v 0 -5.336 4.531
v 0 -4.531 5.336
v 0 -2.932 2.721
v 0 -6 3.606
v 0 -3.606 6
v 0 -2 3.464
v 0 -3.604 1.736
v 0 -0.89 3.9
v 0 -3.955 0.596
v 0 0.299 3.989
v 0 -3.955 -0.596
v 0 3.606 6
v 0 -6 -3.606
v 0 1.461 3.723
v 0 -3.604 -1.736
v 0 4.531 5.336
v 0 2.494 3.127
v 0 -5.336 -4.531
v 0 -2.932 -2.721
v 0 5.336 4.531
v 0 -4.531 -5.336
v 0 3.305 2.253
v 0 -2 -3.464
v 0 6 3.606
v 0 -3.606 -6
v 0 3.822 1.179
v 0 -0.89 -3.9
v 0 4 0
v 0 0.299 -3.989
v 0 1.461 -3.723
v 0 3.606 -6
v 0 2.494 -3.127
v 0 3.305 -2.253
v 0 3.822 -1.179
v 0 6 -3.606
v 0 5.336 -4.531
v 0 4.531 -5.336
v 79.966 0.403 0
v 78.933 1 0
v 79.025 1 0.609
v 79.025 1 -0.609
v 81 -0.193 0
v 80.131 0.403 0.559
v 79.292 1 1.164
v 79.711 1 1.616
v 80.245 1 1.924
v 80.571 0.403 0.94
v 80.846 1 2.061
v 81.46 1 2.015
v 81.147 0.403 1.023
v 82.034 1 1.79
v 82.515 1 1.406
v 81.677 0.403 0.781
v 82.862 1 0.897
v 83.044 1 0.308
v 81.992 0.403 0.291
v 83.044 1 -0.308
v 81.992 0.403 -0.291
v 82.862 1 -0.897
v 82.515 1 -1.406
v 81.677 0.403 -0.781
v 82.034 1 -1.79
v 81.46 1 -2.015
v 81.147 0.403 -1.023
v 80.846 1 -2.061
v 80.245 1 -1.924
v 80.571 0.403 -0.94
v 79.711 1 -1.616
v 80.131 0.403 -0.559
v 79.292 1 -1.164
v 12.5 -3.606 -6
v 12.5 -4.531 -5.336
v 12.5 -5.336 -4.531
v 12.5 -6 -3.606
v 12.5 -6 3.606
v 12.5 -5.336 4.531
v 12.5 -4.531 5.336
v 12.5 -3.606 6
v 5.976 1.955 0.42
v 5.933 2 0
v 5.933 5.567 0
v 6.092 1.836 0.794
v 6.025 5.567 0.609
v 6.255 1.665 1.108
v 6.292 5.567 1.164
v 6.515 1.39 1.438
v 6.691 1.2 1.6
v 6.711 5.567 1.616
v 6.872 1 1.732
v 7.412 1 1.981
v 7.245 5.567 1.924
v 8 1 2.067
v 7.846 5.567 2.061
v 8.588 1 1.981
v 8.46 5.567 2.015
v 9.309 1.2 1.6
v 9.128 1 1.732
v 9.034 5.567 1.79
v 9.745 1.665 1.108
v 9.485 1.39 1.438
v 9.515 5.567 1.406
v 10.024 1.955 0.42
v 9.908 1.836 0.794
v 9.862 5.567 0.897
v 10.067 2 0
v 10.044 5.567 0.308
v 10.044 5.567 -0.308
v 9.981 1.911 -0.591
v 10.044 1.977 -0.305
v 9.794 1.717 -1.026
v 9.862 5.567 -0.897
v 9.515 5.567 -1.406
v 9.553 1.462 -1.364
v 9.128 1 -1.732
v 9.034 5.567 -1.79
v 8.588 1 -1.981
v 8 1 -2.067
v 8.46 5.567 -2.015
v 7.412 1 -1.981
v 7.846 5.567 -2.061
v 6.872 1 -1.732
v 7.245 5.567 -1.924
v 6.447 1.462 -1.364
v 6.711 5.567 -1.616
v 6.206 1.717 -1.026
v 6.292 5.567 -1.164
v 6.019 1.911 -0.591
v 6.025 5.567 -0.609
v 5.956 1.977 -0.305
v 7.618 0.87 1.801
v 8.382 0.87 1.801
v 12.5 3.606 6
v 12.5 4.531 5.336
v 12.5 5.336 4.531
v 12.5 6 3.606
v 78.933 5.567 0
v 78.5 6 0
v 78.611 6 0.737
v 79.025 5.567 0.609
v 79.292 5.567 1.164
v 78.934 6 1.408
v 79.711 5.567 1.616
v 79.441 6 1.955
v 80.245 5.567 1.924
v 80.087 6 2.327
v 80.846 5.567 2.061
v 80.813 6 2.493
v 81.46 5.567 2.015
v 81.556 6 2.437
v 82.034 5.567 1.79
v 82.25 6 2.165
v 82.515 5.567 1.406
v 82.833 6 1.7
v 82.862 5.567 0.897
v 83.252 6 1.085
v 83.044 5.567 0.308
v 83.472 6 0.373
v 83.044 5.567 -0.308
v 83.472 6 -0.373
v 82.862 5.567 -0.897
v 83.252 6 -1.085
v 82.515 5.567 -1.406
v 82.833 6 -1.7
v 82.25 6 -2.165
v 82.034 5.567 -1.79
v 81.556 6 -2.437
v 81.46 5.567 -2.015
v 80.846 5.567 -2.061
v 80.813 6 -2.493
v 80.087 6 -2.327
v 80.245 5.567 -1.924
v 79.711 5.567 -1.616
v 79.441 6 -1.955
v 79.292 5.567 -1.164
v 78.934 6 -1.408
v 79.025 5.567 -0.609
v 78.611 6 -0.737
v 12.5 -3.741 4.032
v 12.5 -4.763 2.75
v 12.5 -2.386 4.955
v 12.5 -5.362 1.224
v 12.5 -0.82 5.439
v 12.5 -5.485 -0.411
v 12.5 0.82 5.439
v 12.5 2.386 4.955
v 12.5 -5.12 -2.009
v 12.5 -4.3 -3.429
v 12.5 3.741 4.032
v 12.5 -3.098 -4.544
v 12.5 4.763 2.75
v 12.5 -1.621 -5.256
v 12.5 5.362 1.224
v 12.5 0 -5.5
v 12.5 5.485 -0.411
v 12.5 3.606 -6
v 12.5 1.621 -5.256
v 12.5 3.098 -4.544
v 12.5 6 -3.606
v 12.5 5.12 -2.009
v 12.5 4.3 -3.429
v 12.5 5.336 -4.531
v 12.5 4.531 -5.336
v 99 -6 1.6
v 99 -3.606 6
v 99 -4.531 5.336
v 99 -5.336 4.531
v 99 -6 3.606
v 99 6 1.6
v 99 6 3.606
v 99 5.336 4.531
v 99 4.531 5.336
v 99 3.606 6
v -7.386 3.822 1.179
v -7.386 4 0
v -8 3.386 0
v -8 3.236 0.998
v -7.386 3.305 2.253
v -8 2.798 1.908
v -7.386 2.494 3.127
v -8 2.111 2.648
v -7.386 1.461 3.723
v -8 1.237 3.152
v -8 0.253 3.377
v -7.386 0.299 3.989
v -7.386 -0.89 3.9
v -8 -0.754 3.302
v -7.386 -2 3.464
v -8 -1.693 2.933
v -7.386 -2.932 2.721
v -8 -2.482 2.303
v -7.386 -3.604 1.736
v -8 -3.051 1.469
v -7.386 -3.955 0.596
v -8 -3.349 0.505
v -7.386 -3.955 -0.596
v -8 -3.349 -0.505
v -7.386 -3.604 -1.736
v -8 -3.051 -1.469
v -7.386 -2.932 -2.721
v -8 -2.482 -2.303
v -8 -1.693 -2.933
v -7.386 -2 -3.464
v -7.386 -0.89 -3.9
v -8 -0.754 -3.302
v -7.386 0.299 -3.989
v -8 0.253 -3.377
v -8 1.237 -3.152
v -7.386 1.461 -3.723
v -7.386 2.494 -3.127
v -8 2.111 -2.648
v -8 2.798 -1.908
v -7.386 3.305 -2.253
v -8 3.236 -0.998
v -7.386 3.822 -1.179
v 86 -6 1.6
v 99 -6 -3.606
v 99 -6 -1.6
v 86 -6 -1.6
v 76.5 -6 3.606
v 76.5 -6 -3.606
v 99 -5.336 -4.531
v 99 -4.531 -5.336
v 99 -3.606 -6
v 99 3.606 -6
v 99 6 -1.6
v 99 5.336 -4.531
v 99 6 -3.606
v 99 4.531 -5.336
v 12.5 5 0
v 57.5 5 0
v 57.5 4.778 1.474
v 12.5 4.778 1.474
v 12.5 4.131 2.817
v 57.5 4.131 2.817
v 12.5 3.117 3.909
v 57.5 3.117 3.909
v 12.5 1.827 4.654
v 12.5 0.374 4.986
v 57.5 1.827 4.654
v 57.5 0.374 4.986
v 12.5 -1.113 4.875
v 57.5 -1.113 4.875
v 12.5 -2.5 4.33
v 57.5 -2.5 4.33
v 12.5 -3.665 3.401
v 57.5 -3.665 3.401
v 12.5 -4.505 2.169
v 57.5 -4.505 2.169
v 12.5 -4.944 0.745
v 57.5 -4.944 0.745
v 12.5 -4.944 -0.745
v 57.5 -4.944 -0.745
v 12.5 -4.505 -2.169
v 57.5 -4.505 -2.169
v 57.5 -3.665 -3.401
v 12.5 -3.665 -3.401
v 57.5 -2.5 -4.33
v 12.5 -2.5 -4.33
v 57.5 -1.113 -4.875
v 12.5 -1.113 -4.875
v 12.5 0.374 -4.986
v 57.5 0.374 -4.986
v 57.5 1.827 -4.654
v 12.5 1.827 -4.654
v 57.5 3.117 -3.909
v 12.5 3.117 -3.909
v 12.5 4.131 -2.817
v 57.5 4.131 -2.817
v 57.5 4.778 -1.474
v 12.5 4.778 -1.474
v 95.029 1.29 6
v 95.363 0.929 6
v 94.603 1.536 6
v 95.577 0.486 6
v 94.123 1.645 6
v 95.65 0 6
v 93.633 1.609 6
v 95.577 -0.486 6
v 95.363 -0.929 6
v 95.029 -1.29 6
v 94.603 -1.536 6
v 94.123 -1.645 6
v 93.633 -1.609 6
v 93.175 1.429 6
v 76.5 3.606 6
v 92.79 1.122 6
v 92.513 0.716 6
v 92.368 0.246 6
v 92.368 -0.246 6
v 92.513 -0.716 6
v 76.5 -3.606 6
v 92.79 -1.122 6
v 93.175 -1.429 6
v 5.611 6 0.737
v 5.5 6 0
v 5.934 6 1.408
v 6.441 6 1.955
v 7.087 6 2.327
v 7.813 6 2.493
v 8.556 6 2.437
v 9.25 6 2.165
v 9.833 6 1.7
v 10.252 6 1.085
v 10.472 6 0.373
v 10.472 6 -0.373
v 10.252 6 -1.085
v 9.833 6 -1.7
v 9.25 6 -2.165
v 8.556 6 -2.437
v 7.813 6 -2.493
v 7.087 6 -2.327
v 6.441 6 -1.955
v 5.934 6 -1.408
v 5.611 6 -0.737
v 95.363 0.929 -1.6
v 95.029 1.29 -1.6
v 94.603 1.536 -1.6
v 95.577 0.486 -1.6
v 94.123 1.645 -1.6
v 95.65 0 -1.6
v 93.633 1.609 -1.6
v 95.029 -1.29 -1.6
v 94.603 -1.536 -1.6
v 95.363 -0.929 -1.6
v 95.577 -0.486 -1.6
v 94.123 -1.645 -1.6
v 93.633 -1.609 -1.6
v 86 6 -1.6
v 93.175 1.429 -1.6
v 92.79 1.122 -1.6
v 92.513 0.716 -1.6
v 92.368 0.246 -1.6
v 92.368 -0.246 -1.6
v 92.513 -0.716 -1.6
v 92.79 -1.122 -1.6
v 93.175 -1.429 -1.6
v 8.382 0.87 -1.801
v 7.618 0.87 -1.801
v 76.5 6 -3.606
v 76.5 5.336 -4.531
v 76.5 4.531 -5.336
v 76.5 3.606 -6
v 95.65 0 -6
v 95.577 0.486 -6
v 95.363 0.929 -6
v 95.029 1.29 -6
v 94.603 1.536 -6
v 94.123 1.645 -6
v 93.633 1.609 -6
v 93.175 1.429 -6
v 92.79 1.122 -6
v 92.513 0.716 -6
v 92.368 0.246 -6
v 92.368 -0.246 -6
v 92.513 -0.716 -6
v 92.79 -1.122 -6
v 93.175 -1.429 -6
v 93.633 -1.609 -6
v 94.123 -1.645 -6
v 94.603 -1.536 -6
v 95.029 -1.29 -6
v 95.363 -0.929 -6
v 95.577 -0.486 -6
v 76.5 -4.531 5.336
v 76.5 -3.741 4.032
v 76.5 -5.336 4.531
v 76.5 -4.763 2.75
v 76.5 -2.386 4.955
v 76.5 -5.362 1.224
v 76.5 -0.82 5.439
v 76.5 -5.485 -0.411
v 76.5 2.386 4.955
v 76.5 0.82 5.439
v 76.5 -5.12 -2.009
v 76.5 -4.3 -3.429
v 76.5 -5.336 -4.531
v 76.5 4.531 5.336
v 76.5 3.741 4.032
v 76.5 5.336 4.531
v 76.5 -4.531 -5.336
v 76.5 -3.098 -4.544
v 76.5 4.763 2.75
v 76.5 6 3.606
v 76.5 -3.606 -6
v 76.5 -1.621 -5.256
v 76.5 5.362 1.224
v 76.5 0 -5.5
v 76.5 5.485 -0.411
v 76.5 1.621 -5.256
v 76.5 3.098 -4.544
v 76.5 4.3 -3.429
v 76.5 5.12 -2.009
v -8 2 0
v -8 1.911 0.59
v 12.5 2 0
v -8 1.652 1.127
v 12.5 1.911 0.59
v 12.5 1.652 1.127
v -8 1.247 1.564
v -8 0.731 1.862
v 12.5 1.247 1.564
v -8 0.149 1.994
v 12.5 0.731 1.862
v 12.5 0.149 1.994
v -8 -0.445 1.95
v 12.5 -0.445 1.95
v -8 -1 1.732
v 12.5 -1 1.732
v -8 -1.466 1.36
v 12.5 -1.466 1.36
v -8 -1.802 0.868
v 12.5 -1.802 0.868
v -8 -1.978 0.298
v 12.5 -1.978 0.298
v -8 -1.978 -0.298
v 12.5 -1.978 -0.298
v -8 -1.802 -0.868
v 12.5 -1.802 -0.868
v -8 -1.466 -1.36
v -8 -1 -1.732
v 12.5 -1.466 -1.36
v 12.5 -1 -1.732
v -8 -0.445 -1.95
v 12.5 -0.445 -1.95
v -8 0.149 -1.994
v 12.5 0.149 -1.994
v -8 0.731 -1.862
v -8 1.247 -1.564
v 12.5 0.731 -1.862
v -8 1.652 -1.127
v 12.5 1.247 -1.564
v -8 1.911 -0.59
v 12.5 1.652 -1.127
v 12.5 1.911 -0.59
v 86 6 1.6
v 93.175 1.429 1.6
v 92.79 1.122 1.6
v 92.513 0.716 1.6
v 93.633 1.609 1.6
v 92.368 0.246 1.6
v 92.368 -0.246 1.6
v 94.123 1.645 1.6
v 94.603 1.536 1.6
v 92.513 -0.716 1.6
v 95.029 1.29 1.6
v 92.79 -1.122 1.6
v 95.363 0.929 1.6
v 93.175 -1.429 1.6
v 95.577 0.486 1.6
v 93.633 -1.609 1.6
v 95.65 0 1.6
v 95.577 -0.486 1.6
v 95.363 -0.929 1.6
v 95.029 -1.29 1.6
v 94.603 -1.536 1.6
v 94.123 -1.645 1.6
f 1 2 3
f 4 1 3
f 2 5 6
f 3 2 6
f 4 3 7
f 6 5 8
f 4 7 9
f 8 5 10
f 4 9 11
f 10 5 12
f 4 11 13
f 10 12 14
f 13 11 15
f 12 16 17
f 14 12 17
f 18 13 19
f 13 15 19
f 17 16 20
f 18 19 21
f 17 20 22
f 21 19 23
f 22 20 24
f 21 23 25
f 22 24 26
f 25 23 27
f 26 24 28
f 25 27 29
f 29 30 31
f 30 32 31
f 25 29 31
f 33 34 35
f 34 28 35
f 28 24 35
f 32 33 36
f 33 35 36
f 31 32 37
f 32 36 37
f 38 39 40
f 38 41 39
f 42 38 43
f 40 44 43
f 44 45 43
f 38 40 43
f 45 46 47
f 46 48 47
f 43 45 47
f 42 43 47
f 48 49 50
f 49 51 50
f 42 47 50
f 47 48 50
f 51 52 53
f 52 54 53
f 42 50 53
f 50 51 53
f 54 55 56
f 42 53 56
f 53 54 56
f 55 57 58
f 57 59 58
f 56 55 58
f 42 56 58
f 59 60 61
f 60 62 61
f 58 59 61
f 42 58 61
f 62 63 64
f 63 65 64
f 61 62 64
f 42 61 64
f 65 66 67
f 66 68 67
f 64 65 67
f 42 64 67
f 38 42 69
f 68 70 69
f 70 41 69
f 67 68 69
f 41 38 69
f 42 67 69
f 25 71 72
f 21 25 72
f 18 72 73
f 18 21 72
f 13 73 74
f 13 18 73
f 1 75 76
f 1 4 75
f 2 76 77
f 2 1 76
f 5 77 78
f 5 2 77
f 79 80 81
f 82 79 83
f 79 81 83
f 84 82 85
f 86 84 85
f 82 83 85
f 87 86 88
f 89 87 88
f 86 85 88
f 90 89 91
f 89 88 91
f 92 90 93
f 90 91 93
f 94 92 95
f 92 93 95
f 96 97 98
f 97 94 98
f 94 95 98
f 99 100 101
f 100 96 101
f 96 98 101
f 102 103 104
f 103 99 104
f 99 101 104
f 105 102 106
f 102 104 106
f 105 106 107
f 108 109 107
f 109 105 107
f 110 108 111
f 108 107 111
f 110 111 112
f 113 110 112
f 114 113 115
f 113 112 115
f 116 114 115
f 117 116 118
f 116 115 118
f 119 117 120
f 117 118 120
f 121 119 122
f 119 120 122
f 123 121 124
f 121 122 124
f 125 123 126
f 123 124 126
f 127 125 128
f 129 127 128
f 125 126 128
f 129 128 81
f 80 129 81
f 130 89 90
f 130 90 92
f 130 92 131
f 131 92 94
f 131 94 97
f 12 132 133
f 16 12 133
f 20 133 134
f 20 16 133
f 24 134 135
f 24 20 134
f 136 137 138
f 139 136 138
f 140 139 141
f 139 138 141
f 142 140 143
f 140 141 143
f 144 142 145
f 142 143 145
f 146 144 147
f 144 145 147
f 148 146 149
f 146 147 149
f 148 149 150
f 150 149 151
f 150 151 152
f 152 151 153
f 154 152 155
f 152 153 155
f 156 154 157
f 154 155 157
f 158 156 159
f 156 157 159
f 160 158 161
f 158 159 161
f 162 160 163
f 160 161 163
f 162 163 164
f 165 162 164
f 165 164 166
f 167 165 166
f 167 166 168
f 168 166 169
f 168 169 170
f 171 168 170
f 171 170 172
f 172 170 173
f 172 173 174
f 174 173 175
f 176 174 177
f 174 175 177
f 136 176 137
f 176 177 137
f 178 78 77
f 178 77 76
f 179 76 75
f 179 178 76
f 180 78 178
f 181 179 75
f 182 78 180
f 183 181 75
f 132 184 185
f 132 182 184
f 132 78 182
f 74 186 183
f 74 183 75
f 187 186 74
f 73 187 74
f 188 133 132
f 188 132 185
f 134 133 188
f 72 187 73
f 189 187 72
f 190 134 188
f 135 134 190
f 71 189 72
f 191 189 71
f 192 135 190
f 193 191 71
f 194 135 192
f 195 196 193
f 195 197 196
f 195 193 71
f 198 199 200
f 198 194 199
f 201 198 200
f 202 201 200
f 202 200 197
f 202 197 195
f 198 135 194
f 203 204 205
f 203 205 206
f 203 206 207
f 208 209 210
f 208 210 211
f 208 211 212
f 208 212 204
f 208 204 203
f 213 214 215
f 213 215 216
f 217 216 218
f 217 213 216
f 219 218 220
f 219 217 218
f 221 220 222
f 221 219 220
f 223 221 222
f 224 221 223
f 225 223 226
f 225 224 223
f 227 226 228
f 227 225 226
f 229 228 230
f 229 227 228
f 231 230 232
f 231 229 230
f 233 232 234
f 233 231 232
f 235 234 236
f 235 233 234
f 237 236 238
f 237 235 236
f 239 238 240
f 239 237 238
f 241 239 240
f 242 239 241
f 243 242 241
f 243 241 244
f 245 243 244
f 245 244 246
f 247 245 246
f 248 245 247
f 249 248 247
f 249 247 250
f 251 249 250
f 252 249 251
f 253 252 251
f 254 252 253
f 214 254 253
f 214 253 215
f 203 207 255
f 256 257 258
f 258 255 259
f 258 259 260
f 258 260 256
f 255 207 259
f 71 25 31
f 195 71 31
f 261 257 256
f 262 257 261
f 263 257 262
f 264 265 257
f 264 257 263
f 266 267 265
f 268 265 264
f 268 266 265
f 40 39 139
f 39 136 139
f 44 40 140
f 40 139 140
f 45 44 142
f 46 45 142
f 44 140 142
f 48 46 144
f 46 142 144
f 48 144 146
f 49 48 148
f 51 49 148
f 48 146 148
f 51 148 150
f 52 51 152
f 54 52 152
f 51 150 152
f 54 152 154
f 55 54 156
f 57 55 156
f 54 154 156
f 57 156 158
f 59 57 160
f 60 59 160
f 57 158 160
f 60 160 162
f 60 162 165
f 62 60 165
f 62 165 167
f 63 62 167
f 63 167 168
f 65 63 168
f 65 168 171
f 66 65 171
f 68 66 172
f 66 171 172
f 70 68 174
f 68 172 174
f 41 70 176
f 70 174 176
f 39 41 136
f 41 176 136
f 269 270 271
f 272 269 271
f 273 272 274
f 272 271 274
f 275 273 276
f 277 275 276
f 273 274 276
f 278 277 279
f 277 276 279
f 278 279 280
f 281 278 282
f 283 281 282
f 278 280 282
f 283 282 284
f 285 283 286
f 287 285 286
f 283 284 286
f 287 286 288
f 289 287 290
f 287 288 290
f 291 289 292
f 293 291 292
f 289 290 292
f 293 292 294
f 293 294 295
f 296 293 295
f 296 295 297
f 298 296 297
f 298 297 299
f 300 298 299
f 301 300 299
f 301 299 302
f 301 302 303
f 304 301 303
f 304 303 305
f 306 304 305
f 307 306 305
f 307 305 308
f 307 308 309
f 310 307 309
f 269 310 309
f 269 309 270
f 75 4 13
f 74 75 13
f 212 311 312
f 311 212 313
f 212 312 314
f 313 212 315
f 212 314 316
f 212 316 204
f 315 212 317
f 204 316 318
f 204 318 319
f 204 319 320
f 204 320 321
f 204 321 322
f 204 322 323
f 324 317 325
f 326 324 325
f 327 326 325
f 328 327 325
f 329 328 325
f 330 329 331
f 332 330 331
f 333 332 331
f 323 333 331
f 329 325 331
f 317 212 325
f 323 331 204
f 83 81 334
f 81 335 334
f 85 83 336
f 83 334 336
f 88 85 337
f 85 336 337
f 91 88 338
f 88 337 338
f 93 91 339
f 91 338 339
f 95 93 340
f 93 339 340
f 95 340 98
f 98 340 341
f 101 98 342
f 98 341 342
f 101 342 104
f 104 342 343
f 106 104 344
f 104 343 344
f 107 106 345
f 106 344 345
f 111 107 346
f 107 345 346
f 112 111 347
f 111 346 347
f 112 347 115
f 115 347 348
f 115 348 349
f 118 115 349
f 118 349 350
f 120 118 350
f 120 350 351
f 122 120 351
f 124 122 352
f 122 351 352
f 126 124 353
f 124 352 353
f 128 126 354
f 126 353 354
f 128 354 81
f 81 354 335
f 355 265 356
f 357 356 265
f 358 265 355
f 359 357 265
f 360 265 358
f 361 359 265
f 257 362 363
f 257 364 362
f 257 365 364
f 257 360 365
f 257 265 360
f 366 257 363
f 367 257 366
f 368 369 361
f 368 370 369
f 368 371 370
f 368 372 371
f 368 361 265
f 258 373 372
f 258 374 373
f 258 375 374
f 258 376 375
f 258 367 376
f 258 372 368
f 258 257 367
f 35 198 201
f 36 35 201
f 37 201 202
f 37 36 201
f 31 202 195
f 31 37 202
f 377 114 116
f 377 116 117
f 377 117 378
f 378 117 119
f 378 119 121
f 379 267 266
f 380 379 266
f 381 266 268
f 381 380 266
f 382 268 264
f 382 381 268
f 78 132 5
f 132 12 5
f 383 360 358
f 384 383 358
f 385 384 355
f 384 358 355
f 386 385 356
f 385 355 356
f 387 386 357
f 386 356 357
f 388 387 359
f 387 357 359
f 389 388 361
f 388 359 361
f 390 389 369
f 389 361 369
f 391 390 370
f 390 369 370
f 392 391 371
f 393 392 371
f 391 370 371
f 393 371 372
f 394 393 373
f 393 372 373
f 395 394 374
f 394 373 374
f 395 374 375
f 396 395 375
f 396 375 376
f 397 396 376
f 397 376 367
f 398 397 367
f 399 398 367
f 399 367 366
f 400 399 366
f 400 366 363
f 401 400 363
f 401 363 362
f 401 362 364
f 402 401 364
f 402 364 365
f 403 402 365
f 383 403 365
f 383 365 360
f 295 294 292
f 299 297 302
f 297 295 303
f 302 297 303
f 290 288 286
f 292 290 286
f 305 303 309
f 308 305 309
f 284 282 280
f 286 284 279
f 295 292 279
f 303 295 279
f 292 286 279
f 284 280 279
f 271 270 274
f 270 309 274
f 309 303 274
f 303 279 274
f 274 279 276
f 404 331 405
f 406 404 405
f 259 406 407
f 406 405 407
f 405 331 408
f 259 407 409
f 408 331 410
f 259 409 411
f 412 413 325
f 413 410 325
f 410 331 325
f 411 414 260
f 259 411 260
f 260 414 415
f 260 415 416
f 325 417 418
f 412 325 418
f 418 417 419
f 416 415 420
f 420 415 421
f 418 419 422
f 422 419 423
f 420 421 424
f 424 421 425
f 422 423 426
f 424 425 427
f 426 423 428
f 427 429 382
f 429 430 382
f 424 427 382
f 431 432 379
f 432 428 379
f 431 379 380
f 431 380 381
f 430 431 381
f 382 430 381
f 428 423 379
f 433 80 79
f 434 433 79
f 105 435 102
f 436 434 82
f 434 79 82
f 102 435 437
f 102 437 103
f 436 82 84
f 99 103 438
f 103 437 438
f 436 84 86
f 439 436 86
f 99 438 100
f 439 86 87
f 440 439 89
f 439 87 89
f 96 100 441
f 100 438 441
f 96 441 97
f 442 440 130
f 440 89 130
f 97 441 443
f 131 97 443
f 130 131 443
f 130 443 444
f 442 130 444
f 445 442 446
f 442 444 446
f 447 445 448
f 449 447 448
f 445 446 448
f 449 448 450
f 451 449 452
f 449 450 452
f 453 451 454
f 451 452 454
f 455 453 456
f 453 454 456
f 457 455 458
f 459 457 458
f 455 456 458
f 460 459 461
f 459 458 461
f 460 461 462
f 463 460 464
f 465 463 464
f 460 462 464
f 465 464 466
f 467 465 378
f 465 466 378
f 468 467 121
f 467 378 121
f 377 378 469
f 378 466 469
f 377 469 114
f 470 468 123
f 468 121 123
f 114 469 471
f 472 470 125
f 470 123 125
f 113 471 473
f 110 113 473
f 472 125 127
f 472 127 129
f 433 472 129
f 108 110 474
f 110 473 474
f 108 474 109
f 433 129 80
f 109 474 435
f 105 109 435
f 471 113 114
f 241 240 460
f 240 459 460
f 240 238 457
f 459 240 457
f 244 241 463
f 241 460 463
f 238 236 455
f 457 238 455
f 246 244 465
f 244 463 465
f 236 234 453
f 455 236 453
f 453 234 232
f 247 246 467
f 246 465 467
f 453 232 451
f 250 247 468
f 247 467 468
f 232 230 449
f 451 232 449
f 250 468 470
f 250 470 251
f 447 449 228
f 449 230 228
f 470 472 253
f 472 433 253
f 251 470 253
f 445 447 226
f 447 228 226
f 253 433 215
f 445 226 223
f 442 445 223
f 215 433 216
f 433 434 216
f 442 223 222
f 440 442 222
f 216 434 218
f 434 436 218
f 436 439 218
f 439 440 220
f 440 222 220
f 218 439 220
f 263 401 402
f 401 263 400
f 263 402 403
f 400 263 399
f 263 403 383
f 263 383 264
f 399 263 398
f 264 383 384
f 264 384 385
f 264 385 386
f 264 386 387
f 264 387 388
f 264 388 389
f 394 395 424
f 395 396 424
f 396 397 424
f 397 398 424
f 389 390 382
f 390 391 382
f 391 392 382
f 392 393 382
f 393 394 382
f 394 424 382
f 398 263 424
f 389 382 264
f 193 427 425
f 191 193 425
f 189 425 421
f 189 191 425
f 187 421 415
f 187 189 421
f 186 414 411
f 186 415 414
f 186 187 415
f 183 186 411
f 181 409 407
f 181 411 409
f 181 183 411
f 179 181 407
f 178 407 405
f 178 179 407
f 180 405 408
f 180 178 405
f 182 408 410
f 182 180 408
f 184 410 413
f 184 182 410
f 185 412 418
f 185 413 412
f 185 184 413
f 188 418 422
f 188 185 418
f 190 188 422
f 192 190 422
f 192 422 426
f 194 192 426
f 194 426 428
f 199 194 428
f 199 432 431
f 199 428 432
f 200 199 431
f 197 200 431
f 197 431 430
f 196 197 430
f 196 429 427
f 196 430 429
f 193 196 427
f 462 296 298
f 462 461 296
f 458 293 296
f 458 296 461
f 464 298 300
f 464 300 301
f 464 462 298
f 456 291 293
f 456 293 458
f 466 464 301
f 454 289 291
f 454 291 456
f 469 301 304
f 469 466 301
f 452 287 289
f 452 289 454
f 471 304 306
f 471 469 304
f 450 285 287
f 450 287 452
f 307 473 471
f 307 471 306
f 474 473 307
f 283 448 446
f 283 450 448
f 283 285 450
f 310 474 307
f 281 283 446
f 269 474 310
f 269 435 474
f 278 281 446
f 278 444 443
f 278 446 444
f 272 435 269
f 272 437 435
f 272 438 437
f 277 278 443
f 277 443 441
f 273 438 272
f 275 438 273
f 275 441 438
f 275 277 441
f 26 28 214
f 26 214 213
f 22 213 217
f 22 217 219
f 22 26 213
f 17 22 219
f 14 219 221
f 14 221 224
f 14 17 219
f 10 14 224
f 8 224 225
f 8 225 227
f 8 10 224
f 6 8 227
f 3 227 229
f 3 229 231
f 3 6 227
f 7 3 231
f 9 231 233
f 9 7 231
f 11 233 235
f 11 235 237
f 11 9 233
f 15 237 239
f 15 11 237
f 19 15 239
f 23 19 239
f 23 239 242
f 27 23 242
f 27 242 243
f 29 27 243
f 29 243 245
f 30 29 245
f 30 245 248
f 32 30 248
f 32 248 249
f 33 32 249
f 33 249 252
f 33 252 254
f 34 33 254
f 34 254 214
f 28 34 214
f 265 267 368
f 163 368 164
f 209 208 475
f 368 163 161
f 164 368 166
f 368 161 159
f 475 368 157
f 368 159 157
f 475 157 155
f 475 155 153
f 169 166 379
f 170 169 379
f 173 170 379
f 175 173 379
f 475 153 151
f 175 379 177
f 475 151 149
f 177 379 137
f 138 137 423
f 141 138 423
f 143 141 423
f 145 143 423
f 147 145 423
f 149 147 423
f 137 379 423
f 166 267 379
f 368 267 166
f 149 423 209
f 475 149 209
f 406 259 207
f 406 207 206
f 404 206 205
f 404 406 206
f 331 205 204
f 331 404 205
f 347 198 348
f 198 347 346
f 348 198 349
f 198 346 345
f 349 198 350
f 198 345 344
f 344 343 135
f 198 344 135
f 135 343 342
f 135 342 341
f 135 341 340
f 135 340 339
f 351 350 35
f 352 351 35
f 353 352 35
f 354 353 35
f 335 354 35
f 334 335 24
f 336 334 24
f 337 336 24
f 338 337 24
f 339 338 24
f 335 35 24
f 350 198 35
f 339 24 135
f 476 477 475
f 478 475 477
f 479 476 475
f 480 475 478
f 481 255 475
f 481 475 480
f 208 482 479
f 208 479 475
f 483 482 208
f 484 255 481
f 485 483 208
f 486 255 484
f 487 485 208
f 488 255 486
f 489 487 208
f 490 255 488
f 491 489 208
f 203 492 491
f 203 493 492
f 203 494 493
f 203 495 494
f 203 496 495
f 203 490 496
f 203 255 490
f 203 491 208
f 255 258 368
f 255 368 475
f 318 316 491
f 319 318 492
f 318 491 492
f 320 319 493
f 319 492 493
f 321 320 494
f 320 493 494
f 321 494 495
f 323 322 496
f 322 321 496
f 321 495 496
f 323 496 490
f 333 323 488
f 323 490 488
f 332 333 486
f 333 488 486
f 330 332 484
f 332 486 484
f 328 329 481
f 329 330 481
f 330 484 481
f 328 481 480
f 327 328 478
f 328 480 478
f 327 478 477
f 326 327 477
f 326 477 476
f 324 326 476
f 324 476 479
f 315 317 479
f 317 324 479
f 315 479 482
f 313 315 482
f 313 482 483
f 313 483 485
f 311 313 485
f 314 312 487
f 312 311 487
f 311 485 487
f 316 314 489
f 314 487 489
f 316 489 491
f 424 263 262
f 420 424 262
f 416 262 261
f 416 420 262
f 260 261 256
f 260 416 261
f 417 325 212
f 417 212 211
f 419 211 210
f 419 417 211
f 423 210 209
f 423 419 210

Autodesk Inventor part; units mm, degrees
sketch "Sketch_8" plane through (0, 0, 0) normal (0, 0, 1) x (1, 0, 0)
  line L0 (0, 0) -> (-8, 0)
  line L1 (-8, 0) -> (-8, 3.3865)
  line L2 (-8, 3.3865) -> (-7.3865, 4)
  line L3 (-7.3865, 4) -> (0, 4)
  line L4 (0, 4) -> (0, 0)
  line L5 (0, 0) -> (-8, 0)
revolve "Revolution1" add sketch "Sketch_8" angle 360 about axis through (0, 0, 0) along (1, 0, 0)
thread "Thread1" size "M8x1" class "6g" standard "ISO Metric profile" length 5.8865
sketch "Sketch_9" plane through (0, 0, 0) normal (1, 0, 0) x (0, 0, -1)
  line L0 (-6, 3.6056) -> (-6, -3.6056)
  arc A0 (-6, -3.6056) -> (-3.6056, -6) centre (0, 0) ccw
  line L1 (-3.6056, -6) -> (3.6056, -6)
  arc A1 (3.6056, -6) -> (6, -3.6056) centre (0, 0) ccw
  line L2 (6, -3.6056) -> (6, 3.6056)
  arc A2 (6, 3.6056) -> (3.6056, 6) centre (0, 0) ccw
  line L3 (3.6056, 6) -> (-3.6056, 6)
  arc A3 (-3.6056, 6) -> (-6, 3.6056) centre (0, 0) ccw
extrude "Extrusion1" add sketch "Sketch_9" along normal blind 12.5
sketch "Sketch_6" plane through (12.5, 0, 0) normal (1, 0, 0) x (0, 0, -1)
  circle A0 centre (0, 0) radius 5.5
extrude "Extrusion2" add sketch "Sketch_6" along normal blind 64
sketch "Sketch_10" plane through (76.5, 0, 0) normal (1, 0, 0) x (0, 0, -1)
  line L0 (-6, 3.6056) -> (-6, -3.6056)
  arc A0 (-6, -3.6056) -> (-3.6056, -6) centre (0, 0) ccw
  line L1 (-3.6056, -6) -> (3.6056, -6)
  arc A1 (3.6056, -6) -> (6, -3.6056) centre (0, 0) ccw
  line L2 (6, -3.6056) -> (6, 3.6056)
  arc A2 (6, 3.6056) -> (3.6056, 6) centre (0, 0) ccw
  line L3 (3.6056, 6) -> (-3.6056, 6)
  arc A3 (-3.6056, 6) -> (-6, 3.6056) centre (0, 0) ccw
extrude "Extrusion3" add sketch "Sketch_10" along normal blind 22.5
sketch "Sketch7" plane through (0, 0, 0) normal (0, 0, 1) x (1, 0, 0)
  line L0 (8, 6) -> (8, 1)
  line L1 (8, -0.1934) -> (5.933, 1)
  line L2 (5.933, 1) -> (5.933, 5.567)
  line L3 (5.933, 5.567) -> (5.5, 6)
  line L4 (5.5, 6) -> (8, 6)
  line L5 (8, 6) -> (8, -0.1934)
revolve "Revolution2" cut sketch "Sketch7" angle 360 about axis through (8, 6, 0) along (0, 1, 0)
thread "Thread2" size "M5x0.8" class "6H" standard "ISO Metric profile" full length
sketch "Sketch_7" plane through (0, 0, 0) normal (0, 0, 1) x (1, 0, 0)
  line L0 (81, 6) -> (81, 1)
  line L1 (81, -0.1934) -> (78.933, 1)
  line L2 (78.933, 1) -> (78.933, 5.567)
  line L3 (78.933, 5.567) -> (78.5, 6)
  line L4 (78.5, 6) -> (81, 6)
  line L5 (81, 6) -> (81, -0.1934)
revolve "Revolution3" cut sketch "Sketch_7" angle 360 about axis through (81, 6, 0) along (0, 1, 0)
thread "Thread3" size "M5x0.8" class "6H" standard "ISO Metric profile" full length
sketch "Sketch_16" plane through (0, 0, 0) normal (0, 0, 1) x (1, 0, 0)
  line L0 (57.5, 0) -> (-8, 0)
  line L1 (-8, 0) -> (-8, 2)
  line L2 (-8, 2) -> (12.5, 2)
  line L3 (12.5, 2) -> (12.5, 5)
  line L4 (12.5, 5) -> (57.5, 5)
  line L5 (57.5, 5) -> (57.5, 0)
  line L6 (57.5, 0) -> (-8, 0)
revolve "Revolution4" cut sketch "Sketch_16" angle 360 about axis through (57.5, 0, 0) along (1, 0, 0)
sketch "Sketch_3" plane through (0, 0, 0) normal (0, 1, 0) x (-1, 0, 0)
  line L0 (-86, 1.6) -> (-99, 1.6)
  line L1 (-99, 1.6) -> (-99, -1.6)
  line L2 (-99, -1.6) -> (-86, -1.6)
  line L3 (-86, -1.6) -> (-86, 1.6)
extrude "Extrusion4" cut sketch "Sketch_3" along normal mid plane 12
sketch "Sketch_13" plane through (0, 0, 0) normal (0, 0, 1) x (1, 0, 0)
  circle A0 centre (94, 0) radius 1.65
extrude "Extrusion5" cut sketch "Sketch_13" along normal mid plane 12
ref_plane "BODY_N_XY" through (94, 0, 0) normal (0, 0, -1) x (1, 0, 0)
ref_plane "BODY_N_YZ" through (94, 0, 0) normal (1, 0, 0) x (0, -1, 0)
ref_plane "BODY_N_ZX" through (94, 0, 0) normal (0, -1, 0) x (0, 0, -1)
ref_plane "BODY_PIN_XY" through (94, 0, 0) normal (-1, 0, 0) x (0, 0, -1)
ref_plane "BODY_PIN_YZ" through (94, 0, 0) normal (0, 0, -1) x (0, -1, 0)
ref_plane "BODY_PIN_ZX" through (94, 0, 0) normal (0, -1, 0) x (-1, 0, 0)
ref_plane "NUT2_XY" through (86, 0, 0) normal (1, 0, 0) x (0, 0, -1)
ref_plane "NUT2_YZ" through (86, 0, 0) normal (0, 0, -1) x (0, 1, 0)
ref_plane "NUT2_ZX" through (86, 0, 0) normal (0, 1, 0) x (1, 0, 0)
ref_plane "SW1_XY" through (17, 0, 0) normal (1, 0, 0) x (0, 0, -1)
ref_plane "SW1_YZ" through (17, 0, 0) normal (0, 0, -1) x (0, 1, 0)
ref_plane "SW1_ZX" through (17, 0, 0) normal (0, 1, 0) x (1, 0, 0)
ref_plane "SW2_XY" through (72, 0, 0) normal (-1, 0, 0) x (0, 0, -1)
ref_plane "SW2_YZ" through (72, 0, 0) normal (0, 0, -1) x (0, -1, 0)
ref_plane "SW2_ZX" through (72, 0, 0) normal (0, -1, 0) x (-1, 0, 0)
ref_plane "SW_R1_XY" through (17, -11, 0) normal (1, 0, 0) x (0, 0, -1)
ref_plane "SW_R1_YZ" through (17, -11, 0) normal (0, 0, -1) x (0, 1, 0)
ref_plane "SW_R1_ZX" through (17, -11, 0) normal (0, 1, 0) x (1, 0, 0)
ref_plane "SW_R2_XY" through (72, -11, 0) normal (-1, 0, 0) x (0, 0, -1)
ref_plane "SW_R2_YZ" through (72, -11, 0) normal (0, 0, -1) x (0, -1, 0)
ref_plane "SW_R2_ZX" through (72, -11, 0) normal (0, -1, 0) x (-1, 0, 0)
ref_plane "body_XY" through (0, 0, 0) normal (-1, 0, 0) x (0, 0, -1)
ref_plane "body_YZ" through (0, 0, 0) normal (0, 0, -1) x (0, -1, 0)
ref_plane "body_ZX" through (0, 0, 0) normal (0, -1, 0) x (-1, 0, 0)
properties part number "CJ2D10-40Z(1_0)_BODY"
